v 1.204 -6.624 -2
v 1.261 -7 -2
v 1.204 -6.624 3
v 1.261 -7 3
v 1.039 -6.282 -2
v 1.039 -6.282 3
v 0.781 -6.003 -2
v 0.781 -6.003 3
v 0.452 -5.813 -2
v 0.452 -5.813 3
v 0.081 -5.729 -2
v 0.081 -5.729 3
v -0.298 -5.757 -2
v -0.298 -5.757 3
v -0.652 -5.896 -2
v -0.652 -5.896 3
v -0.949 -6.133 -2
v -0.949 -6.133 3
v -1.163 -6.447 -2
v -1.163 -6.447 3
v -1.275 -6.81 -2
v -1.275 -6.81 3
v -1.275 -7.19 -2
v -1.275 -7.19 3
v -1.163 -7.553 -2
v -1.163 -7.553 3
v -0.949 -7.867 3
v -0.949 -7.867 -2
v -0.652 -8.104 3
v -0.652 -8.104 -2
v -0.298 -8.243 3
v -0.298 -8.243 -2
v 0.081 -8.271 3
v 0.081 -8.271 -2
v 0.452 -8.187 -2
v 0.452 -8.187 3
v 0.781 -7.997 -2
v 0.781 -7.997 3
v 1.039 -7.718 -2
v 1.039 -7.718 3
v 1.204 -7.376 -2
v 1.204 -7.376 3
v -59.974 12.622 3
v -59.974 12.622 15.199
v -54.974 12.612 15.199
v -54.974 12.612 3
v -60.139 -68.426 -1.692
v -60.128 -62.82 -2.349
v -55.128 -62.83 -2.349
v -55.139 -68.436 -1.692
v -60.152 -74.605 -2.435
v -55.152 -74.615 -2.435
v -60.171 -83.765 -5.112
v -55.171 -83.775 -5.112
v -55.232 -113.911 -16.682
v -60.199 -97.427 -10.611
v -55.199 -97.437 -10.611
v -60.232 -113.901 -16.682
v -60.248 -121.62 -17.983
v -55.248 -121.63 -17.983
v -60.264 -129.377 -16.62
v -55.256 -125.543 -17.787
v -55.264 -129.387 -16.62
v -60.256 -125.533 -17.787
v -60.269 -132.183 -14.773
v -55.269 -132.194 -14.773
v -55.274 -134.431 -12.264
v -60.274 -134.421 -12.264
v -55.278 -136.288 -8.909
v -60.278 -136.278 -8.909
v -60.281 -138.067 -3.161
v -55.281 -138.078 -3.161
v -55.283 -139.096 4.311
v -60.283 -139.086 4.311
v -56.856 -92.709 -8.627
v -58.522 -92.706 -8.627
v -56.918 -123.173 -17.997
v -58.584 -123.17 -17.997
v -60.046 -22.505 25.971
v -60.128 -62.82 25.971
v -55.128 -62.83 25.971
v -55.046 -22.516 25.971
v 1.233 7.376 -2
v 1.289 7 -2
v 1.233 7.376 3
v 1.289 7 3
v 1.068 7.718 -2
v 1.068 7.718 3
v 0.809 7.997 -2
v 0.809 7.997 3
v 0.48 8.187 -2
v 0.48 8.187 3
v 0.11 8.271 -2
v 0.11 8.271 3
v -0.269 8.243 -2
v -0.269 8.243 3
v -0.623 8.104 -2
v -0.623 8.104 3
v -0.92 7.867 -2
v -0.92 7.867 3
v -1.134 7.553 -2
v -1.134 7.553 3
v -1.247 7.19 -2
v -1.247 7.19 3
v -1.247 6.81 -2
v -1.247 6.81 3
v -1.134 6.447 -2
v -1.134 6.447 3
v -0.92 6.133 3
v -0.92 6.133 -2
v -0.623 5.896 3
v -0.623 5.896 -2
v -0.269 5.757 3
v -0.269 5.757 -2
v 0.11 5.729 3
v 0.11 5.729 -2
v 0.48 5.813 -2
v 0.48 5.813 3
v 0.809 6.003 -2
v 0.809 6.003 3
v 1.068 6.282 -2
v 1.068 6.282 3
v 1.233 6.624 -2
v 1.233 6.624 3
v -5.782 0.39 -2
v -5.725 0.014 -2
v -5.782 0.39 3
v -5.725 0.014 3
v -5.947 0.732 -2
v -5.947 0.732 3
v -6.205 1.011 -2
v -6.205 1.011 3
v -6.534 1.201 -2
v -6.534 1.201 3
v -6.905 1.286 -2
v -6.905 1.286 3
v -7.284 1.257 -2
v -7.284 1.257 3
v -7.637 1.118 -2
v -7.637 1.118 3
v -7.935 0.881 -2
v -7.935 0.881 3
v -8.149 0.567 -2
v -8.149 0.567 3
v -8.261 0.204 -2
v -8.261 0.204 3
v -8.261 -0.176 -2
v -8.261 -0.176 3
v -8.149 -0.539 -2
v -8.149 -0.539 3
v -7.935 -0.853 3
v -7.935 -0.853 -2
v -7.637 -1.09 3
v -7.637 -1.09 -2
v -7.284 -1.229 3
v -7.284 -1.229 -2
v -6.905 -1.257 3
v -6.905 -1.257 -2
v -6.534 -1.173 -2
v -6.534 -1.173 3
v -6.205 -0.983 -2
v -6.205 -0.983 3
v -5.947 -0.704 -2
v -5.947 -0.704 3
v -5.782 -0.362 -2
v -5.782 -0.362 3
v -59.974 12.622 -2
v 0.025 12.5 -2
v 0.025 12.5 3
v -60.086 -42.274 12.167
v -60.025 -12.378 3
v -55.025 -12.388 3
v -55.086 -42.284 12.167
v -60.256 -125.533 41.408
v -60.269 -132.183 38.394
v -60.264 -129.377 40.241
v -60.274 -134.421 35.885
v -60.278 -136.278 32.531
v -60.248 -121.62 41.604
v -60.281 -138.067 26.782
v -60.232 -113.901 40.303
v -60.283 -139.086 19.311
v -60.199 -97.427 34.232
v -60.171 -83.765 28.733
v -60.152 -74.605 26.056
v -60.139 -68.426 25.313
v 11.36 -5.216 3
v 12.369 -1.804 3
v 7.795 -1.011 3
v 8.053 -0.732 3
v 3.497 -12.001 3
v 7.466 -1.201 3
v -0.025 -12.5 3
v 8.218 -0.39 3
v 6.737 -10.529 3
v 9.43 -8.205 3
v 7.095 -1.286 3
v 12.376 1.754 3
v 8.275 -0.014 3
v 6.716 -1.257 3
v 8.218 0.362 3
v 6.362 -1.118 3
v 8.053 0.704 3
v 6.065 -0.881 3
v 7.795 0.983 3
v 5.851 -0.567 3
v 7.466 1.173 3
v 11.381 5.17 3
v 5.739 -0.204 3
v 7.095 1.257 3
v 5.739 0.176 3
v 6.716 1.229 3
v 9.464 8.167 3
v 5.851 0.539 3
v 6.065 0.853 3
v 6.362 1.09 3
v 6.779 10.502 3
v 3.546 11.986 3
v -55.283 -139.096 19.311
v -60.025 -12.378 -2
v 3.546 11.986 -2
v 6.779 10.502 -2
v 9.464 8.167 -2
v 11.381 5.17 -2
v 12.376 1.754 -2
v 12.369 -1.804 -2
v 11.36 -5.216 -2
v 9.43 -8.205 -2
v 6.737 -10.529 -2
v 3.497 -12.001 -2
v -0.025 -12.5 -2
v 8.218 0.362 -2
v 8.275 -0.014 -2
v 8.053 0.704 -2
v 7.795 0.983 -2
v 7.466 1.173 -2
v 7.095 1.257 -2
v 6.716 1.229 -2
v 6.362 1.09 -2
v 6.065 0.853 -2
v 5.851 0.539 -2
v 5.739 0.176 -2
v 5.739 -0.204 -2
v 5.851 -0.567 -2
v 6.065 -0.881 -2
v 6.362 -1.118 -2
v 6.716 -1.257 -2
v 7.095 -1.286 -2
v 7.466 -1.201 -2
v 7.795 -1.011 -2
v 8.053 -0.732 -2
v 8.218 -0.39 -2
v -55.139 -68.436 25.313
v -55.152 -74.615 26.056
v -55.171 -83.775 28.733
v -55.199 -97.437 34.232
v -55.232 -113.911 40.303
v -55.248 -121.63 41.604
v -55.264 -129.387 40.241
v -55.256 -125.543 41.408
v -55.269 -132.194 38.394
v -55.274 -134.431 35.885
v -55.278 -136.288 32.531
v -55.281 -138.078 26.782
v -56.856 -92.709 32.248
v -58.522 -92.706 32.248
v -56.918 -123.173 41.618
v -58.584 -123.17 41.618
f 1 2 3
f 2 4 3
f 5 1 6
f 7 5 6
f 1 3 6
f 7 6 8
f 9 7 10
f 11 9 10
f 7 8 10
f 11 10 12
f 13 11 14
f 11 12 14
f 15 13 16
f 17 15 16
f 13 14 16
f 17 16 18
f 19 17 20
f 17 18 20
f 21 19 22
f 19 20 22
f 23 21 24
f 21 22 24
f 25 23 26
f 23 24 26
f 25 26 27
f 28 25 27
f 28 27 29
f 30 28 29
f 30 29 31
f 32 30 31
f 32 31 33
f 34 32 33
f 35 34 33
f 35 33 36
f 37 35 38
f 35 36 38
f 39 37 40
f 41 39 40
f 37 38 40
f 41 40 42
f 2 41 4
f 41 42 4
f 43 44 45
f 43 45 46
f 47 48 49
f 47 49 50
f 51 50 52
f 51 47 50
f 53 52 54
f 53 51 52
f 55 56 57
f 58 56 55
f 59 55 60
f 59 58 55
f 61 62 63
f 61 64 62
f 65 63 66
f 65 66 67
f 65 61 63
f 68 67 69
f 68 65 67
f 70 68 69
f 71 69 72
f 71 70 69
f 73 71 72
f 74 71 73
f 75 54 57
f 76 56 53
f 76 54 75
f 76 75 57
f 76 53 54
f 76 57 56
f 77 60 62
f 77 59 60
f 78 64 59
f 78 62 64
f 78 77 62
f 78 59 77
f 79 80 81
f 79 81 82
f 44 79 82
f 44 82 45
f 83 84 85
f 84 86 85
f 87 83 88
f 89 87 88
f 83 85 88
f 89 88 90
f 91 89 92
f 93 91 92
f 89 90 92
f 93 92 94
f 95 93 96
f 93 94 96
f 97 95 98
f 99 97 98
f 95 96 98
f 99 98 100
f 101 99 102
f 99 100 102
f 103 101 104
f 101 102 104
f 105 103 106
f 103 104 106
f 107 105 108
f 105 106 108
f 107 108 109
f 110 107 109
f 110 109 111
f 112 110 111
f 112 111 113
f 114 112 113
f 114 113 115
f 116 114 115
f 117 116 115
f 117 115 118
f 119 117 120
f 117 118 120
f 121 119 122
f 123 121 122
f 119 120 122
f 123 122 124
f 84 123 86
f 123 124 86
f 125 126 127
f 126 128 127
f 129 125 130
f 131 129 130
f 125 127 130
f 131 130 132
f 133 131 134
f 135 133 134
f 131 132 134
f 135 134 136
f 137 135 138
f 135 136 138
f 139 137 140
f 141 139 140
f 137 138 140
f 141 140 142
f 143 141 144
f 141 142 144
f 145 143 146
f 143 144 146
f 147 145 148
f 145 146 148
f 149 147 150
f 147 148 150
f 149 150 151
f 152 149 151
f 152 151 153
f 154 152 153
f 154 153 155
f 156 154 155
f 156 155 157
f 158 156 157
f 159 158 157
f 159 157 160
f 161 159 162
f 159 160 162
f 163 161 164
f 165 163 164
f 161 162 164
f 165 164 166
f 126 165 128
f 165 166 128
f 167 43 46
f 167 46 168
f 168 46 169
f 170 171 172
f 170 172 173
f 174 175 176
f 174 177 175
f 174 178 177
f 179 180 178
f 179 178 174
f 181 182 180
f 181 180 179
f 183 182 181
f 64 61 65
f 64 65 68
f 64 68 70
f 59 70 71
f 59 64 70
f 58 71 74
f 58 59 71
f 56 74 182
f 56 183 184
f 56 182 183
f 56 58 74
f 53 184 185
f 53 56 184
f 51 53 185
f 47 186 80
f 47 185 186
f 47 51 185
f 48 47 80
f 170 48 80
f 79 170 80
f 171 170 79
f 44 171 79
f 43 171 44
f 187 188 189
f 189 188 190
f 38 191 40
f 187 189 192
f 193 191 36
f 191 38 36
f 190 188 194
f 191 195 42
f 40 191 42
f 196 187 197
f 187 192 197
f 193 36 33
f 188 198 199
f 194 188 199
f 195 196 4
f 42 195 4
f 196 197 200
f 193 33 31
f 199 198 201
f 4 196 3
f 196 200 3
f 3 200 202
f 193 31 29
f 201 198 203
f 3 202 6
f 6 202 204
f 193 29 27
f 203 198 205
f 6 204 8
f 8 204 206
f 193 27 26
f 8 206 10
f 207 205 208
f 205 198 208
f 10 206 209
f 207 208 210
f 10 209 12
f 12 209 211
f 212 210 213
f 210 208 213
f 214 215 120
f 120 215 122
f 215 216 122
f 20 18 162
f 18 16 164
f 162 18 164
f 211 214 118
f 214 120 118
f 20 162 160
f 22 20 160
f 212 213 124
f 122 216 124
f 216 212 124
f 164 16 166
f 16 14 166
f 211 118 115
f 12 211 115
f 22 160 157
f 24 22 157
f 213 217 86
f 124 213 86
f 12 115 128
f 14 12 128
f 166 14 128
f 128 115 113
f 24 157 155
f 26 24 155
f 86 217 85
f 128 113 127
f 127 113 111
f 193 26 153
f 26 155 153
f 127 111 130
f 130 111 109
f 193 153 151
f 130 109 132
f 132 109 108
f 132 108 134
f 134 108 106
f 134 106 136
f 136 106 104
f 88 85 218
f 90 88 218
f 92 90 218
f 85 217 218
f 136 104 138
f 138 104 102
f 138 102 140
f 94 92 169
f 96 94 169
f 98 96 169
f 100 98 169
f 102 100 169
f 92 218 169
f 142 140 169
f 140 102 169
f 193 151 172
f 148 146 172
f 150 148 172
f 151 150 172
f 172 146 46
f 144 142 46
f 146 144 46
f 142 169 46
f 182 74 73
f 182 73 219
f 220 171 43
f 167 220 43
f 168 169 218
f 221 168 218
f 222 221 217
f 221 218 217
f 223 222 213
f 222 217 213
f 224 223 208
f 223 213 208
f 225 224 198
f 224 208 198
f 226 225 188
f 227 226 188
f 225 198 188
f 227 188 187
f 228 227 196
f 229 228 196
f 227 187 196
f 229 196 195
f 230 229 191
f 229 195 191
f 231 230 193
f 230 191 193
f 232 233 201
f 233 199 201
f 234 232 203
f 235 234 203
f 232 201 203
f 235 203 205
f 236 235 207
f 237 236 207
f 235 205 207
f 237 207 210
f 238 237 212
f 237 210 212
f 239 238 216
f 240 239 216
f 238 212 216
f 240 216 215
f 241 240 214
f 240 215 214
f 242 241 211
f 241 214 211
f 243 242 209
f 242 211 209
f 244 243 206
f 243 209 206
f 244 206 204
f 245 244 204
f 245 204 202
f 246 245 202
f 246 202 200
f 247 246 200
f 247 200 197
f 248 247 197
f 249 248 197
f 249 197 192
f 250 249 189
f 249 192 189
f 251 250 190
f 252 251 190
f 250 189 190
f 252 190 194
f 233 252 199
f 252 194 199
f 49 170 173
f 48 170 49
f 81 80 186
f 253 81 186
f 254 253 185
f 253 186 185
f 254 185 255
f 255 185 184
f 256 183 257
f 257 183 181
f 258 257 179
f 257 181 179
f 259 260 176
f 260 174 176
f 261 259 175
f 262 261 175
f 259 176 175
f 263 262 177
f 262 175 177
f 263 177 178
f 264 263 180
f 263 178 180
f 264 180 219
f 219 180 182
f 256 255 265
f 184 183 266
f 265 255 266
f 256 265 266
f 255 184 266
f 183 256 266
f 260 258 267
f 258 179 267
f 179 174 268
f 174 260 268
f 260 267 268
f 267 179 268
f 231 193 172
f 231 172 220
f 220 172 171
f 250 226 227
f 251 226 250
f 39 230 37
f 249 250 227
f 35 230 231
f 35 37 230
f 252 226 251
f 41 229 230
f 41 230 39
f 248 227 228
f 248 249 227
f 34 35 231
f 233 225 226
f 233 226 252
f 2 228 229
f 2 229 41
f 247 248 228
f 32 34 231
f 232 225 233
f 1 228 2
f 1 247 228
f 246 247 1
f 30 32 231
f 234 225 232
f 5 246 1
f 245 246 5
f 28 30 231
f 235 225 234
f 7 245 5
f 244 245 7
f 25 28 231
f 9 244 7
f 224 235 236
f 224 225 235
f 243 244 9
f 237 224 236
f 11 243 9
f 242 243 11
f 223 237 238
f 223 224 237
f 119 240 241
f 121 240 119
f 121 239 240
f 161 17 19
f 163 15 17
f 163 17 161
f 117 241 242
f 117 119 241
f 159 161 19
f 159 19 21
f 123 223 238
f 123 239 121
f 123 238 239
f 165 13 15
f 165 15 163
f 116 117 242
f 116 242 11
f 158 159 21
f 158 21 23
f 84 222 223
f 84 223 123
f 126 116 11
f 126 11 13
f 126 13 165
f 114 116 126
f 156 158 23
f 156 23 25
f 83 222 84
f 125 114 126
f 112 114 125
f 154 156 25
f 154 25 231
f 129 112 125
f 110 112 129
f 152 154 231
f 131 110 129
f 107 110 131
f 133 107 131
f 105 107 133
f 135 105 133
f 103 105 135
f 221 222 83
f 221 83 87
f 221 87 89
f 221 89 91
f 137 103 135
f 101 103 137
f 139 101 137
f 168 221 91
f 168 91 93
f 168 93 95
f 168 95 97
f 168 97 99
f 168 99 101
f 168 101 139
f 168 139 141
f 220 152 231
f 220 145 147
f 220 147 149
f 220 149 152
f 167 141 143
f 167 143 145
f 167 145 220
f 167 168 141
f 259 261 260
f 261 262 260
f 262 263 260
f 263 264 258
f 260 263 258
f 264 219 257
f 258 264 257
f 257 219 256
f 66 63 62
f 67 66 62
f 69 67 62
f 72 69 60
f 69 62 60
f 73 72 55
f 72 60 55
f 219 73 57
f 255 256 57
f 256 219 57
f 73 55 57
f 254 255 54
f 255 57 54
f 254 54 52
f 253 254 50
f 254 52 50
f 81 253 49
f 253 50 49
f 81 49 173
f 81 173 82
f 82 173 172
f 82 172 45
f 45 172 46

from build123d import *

# Parameters (mm, degrees)
SKETCH2_R           = 10
SKETCH2_R_2         = 1.275
BOSS_EXTRUDE1_DEPTH = 3
SKETCH3_R           = 1.275
BOSS_EXTRUDE2_DEPTH = 5
BOSS_EXTRUDE3_DEPTH = 5


with BuildPart() as part:
    # Sketch2 → Boss-Extrude1 (new body)
    with BuildSketch(Plane.XY):
        Circle(SKETCH2_R)
        with Locations((6.999985487, -0.014254341)):
            Circle(SKETCH2_R_2, mode=Mode.SUBTRACT)
        with Locations((-0.014254341, -6.999985487)):
            Circle(SKETCH2_R_2, mode=Mode.SUBTRACT)
        with Locations((-6.999985487, 0.014254341)):
            Circle(SKETCH2_R_2, mode=Mode.SUBTRACT)
        with Locations((0.014254341, 6.999985487)):
            Circle(SKETCH2_R_2, mode=Mode.SUBTRACT)
    extrude(amount=BOSS_EXTRUDE1_DEPTH)

    # Sketch3 → Boss-Extrude2 (add)
    with BuildSketch(Plane.XY.offset(3)):
        with BuildLine():
            Line((-0.02545418, -12.499974083), (-60.02532978, -12.377794019))
            Line((-60.02532978, -12.377794019), (-59.97442142, 12.622154148))
            Line((-59.97442142, 12.622154148), (0.02545418, 12.499974083))
            ThreePointArc((0.02545418, 12.499974083), (12.499974083, -0.02545418), (-0.02545418, -12.499974083))
        make_face()
        with Locations((6.999985487, -0.014254341)):
            Circle(SKETCH3_R, mode=Mode.SUBTRACT)
        with Locations((-0.014254341, -6.999985487)):
            Circle(SKETCH3_R, mode=Mode.SUBTRACT)
        with Locations((-6.999985487, 0.014254341)):
            Circle(SKETCH3_R, mode=Mode.SUBTRACT)
        with Locations((0.014254341, 6.999985487)):
            Circle(SKETCH3_R, mode=Mode.SUBTRACT)
    extrude(amount=-BOSS_EXTRUDE2_DEPTH)

    # Sketch4 → Boss-Extrude3 (add)
    with BuildSketch(Plane(origin=(-59.9998756, 0.122180064, 0), x_dir=(0.002036334, 0.999997927, 0), z_dir=(-0.999997927, 0.002036334, 0))):
        with BuildLine():
            Line((-62.942627893, -25.970573692), (-22.627671819, -25.970573692))
            Line((-22.627671819, -25.970573692), (12.5, -15.199288929))
            Line((12.5, -15.199288929), (12.5, -3))
            Line((12.5, -3), (-12.5, -3))
            Line((-12.5, -3), (-42.396291449, -12.167173681))
            Line((-42.396291449, -12.167173681), (-62.942627893, 2.349426308))
            add(Edge.make_bspline(
                [(-62.942627893, 2.349426308), (-87.492278411, -4.509248518), (-135.602543773, 45.42627104), (-139.208088658, -4.310573692)],
                knots=[0, 0, 0, 0, 1, 1, 1, 1], degree=3))
            Line((-139.208088658, -4.310573692), (-139.208088658, -19.310573692))
            add(Edge.make_bspline(
                [(-62.942627893, -25.970573692), (-87.492278411, -19.111898866), (-135.602543773, -69.047418424), (-139.208088658, -19.310573692)],
                knots=[0, 0, 0, 0, 1, 1, 1, 1], degree=3))
        make_face()
    extrude(amount=-BOSS_EXTRUDE3_DEPTH)


solid = part.part
